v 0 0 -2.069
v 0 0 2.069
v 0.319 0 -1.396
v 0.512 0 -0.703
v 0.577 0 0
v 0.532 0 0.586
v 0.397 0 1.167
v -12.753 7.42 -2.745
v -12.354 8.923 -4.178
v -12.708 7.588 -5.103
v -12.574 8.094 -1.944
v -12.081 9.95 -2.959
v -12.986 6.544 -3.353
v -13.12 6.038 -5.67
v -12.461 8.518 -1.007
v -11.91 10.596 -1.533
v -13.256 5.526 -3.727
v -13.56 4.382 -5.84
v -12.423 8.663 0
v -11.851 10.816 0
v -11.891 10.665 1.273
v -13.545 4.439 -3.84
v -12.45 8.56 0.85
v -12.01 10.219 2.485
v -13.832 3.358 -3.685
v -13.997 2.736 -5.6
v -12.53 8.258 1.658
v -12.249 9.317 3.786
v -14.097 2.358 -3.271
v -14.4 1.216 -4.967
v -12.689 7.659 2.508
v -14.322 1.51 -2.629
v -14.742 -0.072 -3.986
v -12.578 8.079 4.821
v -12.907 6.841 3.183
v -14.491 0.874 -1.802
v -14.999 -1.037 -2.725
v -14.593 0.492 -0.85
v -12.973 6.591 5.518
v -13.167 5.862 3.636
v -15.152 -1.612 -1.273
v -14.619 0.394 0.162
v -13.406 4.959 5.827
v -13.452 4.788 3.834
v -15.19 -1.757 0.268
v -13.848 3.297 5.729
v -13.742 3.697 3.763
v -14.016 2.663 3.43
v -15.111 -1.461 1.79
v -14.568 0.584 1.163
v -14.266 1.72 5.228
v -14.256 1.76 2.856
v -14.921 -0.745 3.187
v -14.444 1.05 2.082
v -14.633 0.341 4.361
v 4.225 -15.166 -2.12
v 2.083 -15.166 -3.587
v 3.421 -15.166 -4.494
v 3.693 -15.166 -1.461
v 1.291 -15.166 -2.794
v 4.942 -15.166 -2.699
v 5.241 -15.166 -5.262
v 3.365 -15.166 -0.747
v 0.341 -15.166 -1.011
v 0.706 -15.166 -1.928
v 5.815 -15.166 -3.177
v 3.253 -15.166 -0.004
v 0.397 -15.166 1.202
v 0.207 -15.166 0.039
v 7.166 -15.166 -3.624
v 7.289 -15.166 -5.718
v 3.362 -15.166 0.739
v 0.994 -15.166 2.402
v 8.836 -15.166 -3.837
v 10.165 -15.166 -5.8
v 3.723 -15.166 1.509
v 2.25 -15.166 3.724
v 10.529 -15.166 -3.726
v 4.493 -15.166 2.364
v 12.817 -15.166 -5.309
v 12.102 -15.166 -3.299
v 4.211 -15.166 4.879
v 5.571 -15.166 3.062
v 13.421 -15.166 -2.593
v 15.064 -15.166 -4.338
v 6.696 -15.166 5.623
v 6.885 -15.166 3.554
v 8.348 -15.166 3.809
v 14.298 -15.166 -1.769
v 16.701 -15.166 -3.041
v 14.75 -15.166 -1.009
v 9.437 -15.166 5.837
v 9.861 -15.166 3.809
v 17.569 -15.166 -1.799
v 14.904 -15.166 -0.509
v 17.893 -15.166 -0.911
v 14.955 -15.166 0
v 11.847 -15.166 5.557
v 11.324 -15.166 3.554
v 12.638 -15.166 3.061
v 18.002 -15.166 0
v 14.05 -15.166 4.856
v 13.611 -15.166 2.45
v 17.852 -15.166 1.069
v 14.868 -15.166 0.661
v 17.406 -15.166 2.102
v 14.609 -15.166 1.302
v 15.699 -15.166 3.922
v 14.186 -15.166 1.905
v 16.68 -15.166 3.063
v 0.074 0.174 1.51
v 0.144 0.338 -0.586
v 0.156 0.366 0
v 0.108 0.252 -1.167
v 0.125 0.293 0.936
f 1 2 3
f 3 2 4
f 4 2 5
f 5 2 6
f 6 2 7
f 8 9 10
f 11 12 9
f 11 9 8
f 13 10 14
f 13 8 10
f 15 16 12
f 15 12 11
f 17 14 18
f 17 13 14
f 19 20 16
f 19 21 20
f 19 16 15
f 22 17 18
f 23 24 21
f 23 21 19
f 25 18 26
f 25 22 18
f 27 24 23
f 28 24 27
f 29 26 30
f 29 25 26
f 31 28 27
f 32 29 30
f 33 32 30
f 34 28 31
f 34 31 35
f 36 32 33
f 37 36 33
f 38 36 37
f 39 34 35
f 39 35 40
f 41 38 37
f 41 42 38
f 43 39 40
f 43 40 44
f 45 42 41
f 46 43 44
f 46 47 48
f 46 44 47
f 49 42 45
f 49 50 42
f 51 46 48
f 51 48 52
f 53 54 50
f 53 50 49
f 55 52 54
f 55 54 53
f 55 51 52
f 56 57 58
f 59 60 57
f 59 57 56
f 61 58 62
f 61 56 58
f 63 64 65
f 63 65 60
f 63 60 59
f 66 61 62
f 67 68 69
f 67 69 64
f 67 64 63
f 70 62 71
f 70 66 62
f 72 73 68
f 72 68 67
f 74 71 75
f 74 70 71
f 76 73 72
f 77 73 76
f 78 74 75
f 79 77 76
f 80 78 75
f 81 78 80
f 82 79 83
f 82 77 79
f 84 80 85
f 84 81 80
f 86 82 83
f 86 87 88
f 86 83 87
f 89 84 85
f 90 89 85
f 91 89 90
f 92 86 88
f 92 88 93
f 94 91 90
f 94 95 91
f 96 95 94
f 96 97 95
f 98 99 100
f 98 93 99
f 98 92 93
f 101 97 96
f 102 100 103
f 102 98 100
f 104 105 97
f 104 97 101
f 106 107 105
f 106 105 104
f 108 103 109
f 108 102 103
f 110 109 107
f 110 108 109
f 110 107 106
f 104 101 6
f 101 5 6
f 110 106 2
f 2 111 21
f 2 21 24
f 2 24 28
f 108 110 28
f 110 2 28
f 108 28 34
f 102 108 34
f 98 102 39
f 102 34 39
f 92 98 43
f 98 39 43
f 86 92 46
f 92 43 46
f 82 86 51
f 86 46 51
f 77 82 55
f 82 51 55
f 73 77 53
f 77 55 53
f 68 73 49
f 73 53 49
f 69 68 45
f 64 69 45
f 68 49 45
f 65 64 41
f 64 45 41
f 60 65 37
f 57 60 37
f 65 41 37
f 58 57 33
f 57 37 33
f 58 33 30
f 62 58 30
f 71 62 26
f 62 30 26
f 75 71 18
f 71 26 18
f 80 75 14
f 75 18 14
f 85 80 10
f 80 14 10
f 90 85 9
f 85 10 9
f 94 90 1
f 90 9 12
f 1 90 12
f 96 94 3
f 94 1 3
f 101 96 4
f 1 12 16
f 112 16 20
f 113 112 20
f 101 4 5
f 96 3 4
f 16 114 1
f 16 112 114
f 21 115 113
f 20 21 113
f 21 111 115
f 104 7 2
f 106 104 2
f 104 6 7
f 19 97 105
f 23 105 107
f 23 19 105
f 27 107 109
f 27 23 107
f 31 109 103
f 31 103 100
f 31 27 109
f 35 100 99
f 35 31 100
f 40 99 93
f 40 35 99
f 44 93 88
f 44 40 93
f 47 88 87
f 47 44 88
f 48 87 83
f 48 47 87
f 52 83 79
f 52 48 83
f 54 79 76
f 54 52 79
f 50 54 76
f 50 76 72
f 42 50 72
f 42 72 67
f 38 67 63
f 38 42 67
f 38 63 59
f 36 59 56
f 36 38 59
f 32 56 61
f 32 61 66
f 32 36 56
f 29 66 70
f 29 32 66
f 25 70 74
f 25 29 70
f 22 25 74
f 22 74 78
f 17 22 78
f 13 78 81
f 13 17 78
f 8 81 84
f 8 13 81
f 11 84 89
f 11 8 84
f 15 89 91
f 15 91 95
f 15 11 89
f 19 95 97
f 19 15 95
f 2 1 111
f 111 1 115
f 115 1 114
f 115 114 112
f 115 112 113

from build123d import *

# Parameters (mm, degrees)
F2_T     = -2
F5_DEPTH = 50


with BuildPart() as f1:
    # F0 (on Top) → F1 (revolve)
    with BuildSketch(Plane.XY):
        Polygon((-25.3351479258, 22.5523764878), (-29.1700512171, 18.1462019682), (18.6146012928, -23.4430542826), (22.4495045841, -19.036879763), align=None)
    revolve(axis=Axis((-5.2777249621, -2.6484261572, 0), (0.754313236, -0.6565146929, 0)))

    # F2
    f2_openings = [f1.faces().sort_by_distance(p)[0] for p in [
        (-29.170051, 18.146202, 0),
        (18.614601, -23.443054, 0),
    ]]
    offset(amount=F2_T, openings=f2_openings)

    # F4 (on offset) → F5 (intersect)
    with BuildSketch(Plane.XY.offset(25)):
        Polygon((-17.0640610158, -8.8143590838), (-10.2202640846, -15.1658570394), (26.4985691756, -15.1658570394), (26.4985691756, 0), (0, 0), (5.9569892474, 13.9789059758), (-9.5655685291, 19.4225348532), align=None)
    extrude(amount=-F5_DEPTH, mode=Mode.INTERSECT)


solid = f1.part
